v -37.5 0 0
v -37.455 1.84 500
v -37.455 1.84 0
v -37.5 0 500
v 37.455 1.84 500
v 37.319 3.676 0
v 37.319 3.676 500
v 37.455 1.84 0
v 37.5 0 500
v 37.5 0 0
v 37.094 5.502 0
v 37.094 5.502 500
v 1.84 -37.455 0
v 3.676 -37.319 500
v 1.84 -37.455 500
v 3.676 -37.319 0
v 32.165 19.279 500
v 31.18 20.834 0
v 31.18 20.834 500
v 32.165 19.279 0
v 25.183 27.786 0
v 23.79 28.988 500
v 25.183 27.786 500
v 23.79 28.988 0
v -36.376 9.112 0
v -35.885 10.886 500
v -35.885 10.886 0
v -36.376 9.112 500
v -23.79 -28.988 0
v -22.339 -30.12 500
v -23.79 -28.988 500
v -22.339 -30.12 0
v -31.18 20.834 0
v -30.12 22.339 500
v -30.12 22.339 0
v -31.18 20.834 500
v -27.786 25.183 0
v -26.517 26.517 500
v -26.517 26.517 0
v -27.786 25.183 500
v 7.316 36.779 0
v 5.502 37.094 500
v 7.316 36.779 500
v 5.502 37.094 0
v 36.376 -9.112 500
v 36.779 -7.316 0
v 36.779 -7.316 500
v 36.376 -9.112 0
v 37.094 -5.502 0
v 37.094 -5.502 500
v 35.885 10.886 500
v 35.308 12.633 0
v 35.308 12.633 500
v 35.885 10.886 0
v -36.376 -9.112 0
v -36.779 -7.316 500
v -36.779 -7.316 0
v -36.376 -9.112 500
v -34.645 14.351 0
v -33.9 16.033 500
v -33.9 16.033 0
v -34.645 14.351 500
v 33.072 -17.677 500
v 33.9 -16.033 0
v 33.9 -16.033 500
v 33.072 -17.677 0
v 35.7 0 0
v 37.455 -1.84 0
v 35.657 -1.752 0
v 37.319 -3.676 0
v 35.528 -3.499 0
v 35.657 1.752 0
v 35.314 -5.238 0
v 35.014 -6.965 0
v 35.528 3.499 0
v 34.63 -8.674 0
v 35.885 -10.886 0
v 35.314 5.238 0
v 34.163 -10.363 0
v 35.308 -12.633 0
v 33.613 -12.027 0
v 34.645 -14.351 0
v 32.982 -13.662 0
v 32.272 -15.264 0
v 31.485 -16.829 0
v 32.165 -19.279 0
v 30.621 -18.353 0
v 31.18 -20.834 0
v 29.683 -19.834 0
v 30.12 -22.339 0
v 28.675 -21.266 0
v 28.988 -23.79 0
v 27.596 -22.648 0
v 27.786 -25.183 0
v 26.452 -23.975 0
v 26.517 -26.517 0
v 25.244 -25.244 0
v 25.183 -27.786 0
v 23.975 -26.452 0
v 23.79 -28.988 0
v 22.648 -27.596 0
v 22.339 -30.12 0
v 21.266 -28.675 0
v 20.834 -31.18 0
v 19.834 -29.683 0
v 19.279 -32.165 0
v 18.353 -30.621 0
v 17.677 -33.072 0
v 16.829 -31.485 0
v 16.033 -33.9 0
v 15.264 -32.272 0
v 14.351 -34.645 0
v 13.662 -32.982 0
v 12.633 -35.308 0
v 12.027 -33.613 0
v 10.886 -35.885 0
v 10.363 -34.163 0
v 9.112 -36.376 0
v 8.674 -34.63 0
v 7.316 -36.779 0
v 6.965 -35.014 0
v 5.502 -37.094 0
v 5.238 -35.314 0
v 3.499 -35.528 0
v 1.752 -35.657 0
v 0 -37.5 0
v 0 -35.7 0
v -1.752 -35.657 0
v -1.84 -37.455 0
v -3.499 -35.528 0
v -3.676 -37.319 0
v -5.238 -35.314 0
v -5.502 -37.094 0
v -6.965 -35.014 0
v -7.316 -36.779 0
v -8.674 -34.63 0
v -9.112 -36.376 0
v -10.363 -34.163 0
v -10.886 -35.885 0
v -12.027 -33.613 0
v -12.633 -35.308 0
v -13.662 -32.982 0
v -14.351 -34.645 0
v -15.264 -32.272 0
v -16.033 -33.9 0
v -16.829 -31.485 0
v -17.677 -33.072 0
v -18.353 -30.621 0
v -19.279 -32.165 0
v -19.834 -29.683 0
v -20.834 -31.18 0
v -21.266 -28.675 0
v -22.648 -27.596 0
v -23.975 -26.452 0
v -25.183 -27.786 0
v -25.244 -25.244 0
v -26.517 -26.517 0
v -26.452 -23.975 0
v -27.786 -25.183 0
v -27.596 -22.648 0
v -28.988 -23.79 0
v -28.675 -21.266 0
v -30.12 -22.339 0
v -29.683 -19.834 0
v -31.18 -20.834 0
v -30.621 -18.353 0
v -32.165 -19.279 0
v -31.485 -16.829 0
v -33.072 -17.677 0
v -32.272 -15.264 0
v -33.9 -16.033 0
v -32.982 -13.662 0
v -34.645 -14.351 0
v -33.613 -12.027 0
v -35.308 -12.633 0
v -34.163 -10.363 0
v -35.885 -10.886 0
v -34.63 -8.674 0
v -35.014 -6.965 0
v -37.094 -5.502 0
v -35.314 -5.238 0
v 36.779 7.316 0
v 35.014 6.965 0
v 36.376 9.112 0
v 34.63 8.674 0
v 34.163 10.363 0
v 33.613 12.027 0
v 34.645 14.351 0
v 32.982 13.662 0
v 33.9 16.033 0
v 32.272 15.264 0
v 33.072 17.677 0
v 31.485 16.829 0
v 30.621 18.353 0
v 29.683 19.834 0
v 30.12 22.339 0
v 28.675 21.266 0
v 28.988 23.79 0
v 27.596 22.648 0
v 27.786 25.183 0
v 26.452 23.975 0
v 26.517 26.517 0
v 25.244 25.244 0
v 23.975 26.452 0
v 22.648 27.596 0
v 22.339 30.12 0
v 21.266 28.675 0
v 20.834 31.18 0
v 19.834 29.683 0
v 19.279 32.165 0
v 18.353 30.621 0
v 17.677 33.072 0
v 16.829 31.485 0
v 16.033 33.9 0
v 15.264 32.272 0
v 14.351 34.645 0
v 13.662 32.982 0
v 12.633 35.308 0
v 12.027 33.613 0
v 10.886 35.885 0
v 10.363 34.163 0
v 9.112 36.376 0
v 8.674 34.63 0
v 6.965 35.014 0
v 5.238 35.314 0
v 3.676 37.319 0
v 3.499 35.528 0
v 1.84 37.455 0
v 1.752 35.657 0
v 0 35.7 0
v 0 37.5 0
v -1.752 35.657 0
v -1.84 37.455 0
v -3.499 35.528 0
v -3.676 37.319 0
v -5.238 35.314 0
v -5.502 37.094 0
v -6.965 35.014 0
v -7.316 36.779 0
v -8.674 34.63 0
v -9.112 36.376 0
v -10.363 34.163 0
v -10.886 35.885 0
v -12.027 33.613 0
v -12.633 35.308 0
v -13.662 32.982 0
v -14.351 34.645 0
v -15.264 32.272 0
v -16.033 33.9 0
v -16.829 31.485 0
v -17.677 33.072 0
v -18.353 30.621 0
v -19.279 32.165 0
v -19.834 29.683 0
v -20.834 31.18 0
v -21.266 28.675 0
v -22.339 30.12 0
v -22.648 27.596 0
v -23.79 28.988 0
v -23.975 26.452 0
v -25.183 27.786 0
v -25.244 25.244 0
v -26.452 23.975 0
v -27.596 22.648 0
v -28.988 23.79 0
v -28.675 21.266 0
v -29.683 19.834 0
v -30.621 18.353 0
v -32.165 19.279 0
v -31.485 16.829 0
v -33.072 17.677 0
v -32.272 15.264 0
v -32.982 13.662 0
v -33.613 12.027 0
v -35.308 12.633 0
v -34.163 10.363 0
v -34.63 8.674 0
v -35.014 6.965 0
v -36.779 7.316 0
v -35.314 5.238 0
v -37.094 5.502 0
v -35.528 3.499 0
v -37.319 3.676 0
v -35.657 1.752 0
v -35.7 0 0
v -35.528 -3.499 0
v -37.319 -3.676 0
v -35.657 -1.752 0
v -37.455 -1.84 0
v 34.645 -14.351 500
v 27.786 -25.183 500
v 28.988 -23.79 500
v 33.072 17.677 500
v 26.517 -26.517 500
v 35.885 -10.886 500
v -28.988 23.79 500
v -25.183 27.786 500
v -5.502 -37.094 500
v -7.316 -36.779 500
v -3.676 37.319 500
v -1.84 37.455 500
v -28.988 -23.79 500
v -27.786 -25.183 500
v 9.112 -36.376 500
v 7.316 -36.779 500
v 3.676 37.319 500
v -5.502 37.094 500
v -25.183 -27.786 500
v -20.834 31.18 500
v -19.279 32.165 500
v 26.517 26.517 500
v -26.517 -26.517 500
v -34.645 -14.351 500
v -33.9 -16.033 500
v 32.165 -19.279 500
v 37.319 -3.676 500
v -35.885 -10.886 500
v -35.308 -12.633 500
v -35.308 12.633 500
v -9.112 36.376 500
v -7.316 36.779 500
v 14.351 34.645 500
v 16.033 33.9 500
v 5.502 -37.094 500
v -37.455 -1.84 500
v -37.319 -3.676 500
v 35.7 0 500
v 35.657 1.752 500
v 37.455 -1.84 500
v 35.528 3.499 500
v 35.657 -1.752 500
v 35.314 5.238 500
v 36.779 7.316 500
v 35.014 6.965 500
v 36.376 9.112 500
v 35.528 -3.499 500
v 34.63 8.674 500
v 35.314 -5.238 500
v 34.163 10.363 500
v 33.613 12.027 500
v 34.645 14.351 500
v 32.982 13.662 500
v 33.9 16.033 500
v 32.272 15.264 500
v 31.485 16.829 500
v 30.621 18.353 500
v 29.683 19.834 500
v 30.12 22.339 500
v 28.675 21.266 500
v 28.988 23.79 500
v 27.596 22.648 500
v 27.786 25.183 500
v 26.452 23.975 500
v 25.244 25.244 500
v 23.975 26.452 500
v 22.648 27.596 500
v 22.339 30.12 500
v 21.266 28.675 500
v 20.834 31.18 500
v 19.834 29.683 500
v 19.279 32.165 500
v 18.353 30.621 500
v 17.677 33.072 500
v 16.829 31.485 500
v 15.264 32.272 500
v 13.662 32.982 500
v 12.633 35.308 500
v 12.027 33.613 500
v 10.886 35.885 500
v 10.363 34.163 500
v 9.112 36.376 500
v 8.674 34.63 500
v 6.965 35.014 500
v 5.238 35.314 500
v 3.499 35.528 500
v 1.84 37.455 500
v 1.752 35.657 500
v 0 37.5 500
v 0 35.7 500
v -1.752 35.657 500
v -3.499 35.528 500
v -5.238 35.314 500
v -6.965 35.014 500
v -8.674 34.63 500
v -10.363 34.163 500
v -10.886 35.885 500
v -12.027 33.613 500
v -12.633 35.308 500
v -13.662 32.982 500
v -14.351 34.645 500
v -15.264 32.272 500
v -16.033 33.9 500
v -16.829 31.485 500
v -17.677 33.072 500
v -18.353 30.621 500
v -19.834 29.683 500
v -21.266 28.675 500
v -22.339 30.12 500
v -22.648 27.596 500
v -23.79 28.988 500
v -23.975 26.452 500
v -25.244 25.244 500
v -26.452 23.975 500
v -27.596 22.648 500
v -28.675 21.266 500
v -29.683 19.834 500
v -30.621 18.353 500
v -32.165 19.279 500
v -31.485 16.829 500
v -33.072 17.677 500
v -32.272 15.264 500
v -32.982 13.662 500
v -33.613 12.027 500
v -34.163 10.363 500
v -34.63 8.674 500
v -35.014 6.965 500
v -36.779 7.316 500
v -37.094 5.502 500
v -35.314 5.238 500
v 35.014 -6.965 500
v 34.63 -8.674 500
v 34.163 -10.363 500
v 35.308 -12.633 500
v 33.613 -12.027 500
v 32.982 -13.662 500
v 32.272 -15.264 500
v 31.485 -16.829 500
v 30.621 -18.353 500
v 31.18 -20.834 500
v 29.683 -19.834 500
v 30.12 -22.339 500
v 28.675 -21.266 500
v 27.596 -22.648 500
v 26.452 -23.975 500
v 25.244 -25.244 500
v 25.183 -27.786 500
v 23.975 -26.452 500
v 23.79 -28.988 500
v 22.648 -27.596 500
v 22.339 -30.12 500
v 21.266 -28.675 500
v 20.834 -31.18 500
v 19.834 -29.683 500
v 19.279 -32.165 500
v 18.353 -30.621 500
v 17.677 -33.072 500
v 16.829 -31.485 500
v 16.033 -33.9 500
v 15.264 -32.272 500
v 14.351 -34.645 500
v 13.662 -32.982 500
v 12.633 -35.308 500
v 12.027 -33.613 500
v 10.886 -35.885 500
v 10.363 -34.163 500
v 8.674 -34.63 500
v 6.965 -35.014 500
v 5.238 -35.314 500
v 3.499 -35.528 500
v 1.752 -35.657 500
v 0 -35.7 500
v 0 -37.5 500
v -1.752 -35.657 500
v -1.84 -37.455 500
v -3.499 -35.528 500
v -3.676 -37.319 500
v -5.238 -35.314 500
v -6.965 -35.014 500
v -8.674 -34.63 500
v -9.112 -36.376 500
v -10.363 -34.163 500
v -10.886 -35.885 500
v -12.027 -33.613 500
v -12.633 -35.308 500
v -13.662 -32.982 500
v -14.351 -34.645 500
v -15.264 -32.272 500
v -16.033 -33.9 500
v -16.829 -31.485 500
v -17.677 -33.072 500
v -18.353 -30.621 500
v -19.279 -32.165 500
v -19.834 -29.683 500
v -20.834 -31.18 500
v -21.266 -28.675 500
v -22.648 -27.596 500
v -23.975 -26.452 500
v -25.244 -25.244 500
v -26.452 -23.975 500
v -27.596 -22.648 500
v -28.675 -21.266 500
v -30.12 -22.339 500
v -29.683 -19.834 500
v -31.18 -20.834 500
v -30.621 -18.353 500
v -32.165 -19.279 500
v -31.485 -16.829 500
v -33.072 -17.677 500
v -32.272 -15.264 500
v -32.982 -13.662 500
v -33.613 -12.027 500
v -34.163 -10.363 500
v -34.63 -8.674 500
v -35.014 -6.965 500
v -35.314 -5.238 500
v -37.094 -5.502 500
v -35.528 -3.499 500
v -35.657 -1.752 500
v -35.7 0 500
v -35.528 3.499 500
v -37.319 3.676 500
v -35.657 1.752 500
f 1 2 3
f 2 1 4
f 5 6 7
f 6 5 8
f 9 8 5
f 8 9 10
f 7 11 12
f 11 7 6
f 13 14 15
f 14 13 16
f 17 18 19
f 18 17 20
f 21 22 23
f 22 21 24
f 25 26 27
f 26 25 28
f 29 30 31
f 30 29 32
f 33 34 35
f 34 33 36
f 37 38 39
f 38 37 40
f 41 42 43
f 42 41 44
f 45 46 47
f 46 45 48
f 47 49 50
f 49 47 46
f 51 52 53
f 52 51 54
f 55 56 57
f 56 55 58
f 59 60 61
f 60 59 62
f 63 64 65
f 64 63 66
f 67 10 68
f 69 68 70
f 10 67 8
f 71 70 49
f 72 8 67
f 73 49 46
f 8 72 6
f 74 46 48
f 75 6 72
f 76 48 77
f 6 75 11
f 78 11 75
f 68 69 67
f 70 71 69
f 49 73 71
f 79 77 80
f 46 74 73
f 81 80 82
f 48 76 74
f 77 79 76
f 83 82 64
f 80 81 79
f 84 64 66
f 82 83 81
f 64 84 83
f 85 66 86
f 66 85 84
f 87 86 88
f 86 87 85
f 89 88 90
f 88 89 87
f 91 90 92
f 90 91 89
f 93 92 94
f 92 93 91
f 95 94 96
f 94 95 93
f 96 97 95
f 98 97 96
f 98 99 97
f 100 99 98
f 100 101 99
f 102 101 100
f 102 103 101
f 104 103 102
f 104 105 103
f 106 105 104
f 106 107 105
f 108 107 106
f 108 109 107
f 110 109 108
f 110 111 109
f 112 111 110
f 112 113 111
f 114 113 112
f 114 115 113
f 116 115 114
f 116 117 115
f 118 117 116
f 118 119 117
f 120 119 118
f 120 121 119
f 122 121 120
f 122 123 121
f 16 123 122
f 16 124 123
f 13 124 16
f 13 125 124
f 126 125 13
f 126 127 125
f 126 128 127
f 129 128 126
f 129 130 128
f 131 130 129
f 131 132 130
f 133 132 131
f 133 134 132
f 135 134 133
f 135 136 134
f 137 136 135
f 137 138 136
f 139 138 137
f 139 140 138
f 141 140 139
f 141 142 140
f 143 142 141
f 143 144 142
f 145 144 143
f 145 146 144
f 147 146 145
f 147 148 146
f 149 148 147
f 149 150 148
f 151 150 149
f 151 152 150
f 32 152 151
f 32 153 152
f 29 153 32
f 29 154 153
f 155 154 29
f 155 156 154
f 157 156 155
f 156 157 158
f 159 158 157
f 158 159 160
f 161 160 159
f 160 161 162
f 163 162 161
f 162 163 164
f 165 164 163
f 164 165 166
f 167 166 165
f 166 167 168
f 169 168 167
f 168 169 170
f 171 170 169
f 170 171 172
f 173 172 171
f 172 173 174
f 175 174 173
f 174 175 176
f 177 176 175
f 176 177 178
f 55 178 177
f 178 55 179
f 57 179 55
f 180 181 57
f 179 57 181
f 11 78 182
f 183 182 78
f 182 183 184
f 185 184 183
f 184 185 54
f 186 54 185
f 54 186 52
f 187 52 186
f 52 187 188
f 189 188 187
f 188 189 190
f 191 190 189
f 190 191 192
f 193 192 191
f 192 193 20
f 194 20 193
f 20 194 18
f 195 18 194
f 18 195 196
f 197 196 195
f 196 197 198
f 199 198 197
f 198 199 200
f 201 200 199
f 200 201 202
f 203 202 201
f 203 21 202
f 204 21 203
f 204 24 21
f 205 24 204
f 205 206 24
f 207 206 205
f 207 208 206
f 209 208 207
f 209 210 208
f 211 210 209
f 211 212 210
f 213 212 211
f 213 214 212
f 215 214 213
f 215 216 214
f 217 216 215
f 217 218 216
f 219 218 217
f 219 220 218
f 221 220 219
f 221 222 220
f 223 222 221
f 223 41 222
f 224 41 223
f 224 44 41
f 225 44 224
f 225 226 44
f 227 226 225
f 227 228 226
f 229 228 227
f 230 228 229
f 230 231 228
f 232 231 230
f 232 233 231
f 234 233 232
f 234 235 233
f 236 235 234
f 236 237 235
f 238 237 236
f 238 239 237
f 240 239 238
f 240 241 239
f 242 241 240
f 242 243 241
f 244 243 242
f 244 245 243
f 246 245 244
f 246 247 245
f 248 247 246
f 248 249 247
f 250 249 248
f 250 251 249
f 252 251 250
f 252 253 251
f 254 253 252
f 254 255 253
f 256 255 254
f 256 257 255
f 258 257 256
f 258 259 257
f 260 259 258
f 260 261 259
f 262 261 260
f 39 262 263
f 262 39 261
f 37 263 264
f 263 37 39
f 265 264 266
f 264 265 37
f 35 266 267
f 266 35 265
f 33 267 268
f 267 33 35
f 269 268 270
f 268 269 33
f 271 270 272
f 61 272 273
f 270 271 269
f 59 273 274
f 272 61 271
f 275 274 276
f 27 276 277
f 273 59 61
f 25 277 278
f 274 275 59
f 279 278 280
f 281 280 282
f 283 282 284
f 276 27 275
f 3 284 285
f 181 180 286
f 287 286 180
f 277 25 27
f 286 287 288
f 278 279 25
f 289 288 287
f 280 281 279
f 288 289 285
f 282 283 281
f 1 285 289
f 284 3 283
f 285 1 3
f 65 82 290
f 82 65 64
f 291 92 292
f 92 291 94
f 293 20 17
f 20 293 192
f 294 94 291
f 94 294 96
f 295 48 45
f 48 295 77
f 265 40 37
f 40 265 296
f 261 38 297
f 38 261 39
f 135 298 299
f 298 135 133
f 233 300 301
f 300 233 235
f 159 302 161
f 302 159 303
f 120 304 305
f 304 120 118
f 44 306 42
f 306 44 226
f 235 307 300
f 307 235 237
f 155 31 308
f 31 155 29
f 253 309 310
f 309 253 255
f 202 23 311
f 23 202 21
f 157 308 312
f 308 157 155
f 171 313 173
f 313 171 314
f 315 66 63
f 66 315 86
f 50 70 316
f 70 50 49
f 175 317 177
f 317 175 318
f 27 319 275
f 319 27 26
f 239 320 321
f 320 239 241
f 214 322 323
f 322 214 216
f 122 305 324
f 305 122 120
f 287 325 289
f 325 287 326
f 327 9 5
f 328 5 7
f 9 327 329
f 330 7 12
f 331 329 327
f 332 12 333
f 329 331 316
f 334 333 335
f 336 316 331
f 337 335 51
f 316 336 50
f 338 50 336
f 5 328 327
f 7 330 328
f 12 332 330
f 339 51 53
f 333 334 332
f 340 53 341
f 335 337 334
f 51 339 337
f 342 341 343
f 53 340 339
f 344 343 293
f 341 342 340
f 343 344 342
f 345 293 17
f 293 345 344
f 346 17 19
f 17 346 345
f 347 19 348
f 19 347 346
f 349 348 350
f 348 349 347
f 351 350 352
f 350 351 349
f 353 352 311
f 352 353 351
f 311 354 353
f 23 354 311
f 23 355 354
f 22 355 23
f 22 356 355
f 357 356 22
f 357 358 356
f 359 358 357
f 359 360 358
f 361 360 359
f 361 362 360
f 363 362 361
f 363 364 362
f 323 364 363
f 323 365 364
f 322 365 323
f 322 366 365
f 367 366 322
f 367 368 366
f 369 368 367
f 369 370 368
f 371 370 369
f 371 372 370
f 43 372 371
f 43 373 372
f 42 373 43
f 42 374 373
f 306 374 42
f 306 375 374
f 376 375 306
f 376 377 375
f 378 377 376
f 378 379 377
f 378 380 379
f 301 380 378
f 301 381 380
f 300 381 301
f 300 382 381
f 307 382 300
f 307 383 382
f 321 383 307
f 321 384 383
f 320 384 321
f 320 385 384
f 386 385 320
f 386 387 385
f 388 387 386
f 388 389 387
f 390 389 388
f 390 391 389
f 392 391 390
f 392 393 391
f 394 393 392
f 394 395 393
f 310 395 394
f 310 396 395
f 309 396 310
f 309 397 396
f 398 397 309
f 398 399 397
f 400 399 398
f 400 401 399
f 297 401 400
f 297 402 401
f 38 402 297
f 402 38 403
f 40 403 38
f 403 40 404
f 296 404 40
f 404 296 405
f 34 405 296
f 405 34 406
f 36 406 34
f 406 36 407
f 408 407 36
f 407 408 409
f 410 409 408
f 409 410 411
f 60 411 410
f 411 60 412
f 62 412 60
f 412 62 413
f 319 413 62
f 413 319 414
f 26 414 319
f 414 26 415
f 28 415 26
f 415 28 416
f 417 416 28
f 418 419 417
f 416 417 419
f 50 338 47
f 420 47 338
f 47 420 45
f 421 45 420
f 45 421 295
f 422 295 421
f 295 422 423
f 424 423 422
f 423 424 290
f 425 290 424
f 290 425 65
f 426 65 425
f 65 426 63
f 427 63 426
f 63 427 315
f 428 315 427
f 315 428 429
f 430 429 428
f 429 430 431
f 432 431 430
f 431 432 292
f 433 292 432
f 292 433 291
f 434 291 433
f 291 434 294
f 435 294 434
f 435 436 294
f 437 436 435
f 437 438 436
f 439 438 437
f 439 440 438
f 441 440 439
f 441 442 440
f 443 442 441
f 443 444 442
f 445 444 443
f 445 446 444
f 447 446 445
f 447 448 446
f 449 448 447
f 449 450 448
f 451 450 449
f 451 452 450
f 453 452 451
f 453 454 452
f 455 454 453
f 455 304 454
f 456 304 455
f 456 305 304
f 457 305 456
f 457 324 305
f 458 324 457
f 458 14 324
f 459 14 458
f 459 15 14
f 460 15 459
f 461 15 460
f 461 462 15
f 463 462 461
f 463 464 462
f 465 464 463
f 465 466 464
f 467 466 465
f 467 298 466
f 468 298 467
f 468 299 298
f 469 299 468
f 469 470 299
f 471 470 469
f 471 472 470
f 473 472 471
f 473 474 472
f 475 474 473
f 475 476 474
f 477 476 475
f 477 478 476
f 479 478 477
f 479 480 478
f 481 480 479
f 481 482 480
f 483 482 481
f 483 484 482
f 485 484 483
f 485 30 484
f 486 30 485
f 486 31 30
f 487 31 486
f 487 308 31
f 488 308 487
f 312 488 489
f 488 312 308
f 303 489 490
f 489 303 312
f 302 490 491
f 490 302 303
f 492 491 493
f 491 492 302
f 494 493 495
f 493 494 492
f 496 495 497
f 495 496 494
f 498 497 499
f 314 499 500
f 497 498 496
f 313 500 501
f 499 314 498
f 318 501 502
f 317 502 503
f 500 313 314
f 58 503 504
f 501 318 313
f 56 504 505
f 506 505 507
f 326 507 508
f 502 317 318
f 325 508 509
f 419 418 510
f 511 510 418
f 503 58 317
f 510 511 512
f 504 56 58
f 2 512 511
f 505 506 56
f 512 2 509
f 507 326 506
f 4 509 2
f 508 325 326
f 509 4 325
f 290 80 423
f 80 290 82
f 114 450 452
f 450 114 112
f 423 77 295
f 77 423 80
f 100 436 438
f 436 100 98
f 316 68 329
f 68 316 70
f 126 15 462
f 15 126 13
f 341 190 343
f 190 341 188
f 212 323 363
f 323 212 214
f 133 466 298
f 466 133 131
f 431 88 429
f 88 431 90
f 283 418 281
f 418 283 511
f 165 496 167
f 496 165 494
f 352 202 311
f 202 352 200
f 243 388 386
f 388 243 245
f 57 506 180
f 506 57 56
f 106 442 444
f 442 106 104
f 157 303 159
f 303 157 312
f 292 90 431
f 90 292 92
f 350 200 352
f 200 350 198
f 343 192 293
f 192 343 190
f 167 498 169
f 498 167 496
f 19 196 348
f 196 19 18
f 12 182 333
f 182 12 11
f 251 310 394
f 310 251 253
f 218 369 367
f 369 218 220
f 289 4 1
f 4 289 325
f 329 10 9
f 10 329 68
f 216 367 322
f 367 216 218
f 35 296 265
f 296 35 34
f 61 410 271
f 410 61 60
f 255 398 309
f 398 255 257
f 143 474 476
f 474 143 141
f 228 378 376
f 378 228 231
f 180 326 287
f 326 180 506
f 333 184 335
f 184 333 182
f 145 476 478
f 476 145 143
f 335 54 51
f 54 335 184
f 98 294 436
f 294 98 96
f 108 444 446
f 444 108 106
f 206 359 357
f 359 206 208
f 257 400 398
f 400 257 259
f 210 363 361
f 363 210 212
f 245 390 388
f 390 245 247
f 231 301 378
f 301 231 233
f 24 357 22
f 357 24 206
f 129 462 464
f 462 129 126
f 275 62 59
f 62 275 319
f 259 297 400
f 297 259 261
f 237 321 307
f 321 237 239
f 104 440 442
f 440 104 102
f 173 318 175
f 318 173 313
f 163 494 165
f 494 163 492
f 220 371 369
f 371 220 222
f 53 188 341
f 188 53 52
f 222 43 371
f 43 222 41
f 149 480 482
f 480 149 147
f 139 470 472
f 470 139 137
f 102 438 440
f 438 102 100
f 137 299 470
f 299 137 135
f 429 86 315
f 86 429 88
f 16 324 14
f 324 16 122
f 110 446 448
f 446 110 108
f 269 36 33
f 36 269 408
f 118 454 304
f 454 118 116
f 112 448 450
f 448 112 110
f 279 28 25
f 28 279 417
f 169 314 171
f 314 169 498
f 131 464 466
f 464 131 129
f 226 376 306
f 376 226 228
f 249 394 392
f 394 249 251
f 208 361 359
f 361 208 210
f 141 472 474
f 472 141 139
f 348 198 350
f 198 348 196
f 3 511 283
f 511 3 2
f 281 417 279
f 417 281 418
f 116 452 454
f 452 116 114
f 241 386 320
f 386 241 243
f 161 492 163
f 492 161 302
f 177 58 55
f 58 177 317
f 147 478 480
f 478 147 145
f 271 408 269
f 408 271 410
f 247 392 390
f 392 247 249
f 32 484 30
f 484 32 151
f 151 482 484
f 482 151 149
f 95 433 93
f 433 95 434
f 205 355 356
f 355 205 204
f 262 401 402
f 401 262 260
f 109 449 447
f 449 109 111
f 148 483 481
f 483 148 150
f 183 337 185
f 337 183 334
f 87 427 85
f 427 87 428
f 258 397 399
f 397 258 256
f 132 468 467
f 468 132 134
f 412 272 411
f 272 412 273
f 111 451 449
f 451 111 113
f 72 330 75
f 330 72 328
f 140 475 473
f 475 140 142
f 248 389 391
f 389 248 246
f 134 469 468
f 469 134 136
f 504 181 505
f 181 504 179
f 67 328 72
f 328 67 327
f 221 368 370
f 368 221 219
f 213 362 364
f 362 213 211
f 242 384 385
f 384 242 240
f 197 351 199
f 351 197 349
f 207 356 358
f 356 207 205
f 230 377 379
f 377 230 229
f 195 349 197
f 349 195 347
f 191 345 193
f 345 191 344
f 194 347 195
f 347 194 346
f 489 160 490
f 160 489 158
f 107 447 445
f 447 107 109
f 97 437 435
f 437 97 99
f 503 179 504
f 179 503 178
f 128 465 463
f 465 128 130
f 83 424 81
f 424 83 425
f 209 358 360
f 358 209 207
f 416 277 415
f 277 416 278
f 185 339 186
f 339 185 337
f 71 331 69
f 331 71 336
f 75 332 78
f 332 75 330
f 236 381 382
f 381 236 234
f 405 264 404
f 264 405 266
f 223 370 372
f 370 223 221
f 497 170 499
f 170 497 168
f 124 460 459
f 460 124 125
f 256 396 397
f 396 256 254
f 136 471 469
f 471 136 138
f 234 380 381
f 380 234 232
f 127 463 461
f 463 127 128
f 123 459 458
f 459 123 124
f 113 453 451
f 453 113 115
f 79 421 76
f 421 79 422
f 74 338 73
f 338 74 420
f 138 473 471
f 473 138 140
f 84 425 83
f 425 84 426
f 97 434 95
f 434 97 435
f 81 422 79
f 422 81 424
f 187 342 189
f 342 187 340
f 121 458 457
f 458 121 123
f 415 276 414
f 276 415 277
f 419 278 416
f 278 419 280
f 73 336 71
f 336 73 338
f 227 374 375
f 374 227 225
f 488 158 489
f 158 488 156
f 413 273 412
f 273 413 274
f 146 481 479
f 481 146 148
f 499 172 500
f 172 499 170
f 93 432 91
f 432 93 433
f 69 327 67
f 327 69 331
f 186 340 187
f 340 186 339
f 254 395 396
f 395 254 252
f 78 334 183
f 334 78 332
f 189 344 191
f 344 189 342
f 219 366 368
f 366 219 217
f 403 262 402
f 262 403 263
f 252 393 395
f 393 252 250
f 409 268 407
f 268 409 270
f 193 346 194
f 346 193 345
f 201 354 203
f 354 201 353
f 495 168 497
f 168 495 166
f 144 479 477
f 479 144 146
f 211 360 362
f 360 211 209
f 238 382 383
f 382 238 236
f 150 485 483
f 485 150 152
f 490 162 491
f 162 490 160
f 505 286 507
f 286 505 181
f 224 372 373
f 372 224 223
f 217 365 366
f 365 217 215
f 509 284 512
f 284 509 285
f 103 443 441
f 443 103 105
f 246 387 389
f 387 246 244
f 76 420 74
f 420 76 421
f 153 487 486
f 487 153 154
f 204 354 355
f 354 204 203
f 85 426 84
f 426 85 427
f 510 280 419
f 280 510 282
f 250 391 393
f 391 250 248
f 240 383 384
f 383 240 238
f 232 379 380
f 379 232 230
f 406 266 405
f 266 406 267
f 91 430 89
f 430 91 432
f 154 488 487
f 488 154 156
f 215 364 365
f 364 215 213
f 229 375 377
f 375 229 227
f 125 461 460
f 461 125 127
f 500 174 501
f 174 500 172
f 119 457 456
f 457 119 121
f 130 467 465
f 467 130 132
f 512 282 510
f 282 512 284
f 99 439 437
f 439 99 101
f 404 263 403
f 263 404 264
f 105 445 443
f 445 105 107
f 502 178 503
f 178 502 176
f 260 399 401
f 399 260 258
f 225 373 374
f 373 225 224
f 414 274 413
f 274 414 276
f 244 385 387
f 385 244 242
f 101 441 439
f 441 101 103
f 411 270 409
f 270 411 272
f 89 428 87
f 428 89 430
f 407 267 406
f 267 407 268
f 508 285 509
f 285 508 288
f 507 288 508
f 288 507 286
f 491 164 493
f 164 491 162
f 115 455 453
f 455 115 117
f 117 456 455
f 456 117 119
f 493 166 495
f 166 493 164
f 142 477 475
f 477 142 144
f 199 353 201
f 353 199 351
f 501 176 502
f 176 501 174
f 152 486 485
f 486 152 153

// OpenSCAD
$fn = 128;

// HT 75 pipe 500 mm (approx. DN75)
// Typical HT pipe outer diameter ~75 mm, wall thickness ~1.8 mm
// Model: hollow cylinder (pipe)

od = 75;        // outer diameter (mm)
wall = 1.8;     // wall thickness (mm)
id = od - 2*wall;
len = 500;      // length (mm)

module ht_pipe(od, id, len) {
    difference() {
        cylinder(h=len, d=od, center=false);
        translate([0,0,-0.1])
            cylinder(h=len+0.2, d=id, center=false);
    }
}

ht_pipe(od, id, len);
